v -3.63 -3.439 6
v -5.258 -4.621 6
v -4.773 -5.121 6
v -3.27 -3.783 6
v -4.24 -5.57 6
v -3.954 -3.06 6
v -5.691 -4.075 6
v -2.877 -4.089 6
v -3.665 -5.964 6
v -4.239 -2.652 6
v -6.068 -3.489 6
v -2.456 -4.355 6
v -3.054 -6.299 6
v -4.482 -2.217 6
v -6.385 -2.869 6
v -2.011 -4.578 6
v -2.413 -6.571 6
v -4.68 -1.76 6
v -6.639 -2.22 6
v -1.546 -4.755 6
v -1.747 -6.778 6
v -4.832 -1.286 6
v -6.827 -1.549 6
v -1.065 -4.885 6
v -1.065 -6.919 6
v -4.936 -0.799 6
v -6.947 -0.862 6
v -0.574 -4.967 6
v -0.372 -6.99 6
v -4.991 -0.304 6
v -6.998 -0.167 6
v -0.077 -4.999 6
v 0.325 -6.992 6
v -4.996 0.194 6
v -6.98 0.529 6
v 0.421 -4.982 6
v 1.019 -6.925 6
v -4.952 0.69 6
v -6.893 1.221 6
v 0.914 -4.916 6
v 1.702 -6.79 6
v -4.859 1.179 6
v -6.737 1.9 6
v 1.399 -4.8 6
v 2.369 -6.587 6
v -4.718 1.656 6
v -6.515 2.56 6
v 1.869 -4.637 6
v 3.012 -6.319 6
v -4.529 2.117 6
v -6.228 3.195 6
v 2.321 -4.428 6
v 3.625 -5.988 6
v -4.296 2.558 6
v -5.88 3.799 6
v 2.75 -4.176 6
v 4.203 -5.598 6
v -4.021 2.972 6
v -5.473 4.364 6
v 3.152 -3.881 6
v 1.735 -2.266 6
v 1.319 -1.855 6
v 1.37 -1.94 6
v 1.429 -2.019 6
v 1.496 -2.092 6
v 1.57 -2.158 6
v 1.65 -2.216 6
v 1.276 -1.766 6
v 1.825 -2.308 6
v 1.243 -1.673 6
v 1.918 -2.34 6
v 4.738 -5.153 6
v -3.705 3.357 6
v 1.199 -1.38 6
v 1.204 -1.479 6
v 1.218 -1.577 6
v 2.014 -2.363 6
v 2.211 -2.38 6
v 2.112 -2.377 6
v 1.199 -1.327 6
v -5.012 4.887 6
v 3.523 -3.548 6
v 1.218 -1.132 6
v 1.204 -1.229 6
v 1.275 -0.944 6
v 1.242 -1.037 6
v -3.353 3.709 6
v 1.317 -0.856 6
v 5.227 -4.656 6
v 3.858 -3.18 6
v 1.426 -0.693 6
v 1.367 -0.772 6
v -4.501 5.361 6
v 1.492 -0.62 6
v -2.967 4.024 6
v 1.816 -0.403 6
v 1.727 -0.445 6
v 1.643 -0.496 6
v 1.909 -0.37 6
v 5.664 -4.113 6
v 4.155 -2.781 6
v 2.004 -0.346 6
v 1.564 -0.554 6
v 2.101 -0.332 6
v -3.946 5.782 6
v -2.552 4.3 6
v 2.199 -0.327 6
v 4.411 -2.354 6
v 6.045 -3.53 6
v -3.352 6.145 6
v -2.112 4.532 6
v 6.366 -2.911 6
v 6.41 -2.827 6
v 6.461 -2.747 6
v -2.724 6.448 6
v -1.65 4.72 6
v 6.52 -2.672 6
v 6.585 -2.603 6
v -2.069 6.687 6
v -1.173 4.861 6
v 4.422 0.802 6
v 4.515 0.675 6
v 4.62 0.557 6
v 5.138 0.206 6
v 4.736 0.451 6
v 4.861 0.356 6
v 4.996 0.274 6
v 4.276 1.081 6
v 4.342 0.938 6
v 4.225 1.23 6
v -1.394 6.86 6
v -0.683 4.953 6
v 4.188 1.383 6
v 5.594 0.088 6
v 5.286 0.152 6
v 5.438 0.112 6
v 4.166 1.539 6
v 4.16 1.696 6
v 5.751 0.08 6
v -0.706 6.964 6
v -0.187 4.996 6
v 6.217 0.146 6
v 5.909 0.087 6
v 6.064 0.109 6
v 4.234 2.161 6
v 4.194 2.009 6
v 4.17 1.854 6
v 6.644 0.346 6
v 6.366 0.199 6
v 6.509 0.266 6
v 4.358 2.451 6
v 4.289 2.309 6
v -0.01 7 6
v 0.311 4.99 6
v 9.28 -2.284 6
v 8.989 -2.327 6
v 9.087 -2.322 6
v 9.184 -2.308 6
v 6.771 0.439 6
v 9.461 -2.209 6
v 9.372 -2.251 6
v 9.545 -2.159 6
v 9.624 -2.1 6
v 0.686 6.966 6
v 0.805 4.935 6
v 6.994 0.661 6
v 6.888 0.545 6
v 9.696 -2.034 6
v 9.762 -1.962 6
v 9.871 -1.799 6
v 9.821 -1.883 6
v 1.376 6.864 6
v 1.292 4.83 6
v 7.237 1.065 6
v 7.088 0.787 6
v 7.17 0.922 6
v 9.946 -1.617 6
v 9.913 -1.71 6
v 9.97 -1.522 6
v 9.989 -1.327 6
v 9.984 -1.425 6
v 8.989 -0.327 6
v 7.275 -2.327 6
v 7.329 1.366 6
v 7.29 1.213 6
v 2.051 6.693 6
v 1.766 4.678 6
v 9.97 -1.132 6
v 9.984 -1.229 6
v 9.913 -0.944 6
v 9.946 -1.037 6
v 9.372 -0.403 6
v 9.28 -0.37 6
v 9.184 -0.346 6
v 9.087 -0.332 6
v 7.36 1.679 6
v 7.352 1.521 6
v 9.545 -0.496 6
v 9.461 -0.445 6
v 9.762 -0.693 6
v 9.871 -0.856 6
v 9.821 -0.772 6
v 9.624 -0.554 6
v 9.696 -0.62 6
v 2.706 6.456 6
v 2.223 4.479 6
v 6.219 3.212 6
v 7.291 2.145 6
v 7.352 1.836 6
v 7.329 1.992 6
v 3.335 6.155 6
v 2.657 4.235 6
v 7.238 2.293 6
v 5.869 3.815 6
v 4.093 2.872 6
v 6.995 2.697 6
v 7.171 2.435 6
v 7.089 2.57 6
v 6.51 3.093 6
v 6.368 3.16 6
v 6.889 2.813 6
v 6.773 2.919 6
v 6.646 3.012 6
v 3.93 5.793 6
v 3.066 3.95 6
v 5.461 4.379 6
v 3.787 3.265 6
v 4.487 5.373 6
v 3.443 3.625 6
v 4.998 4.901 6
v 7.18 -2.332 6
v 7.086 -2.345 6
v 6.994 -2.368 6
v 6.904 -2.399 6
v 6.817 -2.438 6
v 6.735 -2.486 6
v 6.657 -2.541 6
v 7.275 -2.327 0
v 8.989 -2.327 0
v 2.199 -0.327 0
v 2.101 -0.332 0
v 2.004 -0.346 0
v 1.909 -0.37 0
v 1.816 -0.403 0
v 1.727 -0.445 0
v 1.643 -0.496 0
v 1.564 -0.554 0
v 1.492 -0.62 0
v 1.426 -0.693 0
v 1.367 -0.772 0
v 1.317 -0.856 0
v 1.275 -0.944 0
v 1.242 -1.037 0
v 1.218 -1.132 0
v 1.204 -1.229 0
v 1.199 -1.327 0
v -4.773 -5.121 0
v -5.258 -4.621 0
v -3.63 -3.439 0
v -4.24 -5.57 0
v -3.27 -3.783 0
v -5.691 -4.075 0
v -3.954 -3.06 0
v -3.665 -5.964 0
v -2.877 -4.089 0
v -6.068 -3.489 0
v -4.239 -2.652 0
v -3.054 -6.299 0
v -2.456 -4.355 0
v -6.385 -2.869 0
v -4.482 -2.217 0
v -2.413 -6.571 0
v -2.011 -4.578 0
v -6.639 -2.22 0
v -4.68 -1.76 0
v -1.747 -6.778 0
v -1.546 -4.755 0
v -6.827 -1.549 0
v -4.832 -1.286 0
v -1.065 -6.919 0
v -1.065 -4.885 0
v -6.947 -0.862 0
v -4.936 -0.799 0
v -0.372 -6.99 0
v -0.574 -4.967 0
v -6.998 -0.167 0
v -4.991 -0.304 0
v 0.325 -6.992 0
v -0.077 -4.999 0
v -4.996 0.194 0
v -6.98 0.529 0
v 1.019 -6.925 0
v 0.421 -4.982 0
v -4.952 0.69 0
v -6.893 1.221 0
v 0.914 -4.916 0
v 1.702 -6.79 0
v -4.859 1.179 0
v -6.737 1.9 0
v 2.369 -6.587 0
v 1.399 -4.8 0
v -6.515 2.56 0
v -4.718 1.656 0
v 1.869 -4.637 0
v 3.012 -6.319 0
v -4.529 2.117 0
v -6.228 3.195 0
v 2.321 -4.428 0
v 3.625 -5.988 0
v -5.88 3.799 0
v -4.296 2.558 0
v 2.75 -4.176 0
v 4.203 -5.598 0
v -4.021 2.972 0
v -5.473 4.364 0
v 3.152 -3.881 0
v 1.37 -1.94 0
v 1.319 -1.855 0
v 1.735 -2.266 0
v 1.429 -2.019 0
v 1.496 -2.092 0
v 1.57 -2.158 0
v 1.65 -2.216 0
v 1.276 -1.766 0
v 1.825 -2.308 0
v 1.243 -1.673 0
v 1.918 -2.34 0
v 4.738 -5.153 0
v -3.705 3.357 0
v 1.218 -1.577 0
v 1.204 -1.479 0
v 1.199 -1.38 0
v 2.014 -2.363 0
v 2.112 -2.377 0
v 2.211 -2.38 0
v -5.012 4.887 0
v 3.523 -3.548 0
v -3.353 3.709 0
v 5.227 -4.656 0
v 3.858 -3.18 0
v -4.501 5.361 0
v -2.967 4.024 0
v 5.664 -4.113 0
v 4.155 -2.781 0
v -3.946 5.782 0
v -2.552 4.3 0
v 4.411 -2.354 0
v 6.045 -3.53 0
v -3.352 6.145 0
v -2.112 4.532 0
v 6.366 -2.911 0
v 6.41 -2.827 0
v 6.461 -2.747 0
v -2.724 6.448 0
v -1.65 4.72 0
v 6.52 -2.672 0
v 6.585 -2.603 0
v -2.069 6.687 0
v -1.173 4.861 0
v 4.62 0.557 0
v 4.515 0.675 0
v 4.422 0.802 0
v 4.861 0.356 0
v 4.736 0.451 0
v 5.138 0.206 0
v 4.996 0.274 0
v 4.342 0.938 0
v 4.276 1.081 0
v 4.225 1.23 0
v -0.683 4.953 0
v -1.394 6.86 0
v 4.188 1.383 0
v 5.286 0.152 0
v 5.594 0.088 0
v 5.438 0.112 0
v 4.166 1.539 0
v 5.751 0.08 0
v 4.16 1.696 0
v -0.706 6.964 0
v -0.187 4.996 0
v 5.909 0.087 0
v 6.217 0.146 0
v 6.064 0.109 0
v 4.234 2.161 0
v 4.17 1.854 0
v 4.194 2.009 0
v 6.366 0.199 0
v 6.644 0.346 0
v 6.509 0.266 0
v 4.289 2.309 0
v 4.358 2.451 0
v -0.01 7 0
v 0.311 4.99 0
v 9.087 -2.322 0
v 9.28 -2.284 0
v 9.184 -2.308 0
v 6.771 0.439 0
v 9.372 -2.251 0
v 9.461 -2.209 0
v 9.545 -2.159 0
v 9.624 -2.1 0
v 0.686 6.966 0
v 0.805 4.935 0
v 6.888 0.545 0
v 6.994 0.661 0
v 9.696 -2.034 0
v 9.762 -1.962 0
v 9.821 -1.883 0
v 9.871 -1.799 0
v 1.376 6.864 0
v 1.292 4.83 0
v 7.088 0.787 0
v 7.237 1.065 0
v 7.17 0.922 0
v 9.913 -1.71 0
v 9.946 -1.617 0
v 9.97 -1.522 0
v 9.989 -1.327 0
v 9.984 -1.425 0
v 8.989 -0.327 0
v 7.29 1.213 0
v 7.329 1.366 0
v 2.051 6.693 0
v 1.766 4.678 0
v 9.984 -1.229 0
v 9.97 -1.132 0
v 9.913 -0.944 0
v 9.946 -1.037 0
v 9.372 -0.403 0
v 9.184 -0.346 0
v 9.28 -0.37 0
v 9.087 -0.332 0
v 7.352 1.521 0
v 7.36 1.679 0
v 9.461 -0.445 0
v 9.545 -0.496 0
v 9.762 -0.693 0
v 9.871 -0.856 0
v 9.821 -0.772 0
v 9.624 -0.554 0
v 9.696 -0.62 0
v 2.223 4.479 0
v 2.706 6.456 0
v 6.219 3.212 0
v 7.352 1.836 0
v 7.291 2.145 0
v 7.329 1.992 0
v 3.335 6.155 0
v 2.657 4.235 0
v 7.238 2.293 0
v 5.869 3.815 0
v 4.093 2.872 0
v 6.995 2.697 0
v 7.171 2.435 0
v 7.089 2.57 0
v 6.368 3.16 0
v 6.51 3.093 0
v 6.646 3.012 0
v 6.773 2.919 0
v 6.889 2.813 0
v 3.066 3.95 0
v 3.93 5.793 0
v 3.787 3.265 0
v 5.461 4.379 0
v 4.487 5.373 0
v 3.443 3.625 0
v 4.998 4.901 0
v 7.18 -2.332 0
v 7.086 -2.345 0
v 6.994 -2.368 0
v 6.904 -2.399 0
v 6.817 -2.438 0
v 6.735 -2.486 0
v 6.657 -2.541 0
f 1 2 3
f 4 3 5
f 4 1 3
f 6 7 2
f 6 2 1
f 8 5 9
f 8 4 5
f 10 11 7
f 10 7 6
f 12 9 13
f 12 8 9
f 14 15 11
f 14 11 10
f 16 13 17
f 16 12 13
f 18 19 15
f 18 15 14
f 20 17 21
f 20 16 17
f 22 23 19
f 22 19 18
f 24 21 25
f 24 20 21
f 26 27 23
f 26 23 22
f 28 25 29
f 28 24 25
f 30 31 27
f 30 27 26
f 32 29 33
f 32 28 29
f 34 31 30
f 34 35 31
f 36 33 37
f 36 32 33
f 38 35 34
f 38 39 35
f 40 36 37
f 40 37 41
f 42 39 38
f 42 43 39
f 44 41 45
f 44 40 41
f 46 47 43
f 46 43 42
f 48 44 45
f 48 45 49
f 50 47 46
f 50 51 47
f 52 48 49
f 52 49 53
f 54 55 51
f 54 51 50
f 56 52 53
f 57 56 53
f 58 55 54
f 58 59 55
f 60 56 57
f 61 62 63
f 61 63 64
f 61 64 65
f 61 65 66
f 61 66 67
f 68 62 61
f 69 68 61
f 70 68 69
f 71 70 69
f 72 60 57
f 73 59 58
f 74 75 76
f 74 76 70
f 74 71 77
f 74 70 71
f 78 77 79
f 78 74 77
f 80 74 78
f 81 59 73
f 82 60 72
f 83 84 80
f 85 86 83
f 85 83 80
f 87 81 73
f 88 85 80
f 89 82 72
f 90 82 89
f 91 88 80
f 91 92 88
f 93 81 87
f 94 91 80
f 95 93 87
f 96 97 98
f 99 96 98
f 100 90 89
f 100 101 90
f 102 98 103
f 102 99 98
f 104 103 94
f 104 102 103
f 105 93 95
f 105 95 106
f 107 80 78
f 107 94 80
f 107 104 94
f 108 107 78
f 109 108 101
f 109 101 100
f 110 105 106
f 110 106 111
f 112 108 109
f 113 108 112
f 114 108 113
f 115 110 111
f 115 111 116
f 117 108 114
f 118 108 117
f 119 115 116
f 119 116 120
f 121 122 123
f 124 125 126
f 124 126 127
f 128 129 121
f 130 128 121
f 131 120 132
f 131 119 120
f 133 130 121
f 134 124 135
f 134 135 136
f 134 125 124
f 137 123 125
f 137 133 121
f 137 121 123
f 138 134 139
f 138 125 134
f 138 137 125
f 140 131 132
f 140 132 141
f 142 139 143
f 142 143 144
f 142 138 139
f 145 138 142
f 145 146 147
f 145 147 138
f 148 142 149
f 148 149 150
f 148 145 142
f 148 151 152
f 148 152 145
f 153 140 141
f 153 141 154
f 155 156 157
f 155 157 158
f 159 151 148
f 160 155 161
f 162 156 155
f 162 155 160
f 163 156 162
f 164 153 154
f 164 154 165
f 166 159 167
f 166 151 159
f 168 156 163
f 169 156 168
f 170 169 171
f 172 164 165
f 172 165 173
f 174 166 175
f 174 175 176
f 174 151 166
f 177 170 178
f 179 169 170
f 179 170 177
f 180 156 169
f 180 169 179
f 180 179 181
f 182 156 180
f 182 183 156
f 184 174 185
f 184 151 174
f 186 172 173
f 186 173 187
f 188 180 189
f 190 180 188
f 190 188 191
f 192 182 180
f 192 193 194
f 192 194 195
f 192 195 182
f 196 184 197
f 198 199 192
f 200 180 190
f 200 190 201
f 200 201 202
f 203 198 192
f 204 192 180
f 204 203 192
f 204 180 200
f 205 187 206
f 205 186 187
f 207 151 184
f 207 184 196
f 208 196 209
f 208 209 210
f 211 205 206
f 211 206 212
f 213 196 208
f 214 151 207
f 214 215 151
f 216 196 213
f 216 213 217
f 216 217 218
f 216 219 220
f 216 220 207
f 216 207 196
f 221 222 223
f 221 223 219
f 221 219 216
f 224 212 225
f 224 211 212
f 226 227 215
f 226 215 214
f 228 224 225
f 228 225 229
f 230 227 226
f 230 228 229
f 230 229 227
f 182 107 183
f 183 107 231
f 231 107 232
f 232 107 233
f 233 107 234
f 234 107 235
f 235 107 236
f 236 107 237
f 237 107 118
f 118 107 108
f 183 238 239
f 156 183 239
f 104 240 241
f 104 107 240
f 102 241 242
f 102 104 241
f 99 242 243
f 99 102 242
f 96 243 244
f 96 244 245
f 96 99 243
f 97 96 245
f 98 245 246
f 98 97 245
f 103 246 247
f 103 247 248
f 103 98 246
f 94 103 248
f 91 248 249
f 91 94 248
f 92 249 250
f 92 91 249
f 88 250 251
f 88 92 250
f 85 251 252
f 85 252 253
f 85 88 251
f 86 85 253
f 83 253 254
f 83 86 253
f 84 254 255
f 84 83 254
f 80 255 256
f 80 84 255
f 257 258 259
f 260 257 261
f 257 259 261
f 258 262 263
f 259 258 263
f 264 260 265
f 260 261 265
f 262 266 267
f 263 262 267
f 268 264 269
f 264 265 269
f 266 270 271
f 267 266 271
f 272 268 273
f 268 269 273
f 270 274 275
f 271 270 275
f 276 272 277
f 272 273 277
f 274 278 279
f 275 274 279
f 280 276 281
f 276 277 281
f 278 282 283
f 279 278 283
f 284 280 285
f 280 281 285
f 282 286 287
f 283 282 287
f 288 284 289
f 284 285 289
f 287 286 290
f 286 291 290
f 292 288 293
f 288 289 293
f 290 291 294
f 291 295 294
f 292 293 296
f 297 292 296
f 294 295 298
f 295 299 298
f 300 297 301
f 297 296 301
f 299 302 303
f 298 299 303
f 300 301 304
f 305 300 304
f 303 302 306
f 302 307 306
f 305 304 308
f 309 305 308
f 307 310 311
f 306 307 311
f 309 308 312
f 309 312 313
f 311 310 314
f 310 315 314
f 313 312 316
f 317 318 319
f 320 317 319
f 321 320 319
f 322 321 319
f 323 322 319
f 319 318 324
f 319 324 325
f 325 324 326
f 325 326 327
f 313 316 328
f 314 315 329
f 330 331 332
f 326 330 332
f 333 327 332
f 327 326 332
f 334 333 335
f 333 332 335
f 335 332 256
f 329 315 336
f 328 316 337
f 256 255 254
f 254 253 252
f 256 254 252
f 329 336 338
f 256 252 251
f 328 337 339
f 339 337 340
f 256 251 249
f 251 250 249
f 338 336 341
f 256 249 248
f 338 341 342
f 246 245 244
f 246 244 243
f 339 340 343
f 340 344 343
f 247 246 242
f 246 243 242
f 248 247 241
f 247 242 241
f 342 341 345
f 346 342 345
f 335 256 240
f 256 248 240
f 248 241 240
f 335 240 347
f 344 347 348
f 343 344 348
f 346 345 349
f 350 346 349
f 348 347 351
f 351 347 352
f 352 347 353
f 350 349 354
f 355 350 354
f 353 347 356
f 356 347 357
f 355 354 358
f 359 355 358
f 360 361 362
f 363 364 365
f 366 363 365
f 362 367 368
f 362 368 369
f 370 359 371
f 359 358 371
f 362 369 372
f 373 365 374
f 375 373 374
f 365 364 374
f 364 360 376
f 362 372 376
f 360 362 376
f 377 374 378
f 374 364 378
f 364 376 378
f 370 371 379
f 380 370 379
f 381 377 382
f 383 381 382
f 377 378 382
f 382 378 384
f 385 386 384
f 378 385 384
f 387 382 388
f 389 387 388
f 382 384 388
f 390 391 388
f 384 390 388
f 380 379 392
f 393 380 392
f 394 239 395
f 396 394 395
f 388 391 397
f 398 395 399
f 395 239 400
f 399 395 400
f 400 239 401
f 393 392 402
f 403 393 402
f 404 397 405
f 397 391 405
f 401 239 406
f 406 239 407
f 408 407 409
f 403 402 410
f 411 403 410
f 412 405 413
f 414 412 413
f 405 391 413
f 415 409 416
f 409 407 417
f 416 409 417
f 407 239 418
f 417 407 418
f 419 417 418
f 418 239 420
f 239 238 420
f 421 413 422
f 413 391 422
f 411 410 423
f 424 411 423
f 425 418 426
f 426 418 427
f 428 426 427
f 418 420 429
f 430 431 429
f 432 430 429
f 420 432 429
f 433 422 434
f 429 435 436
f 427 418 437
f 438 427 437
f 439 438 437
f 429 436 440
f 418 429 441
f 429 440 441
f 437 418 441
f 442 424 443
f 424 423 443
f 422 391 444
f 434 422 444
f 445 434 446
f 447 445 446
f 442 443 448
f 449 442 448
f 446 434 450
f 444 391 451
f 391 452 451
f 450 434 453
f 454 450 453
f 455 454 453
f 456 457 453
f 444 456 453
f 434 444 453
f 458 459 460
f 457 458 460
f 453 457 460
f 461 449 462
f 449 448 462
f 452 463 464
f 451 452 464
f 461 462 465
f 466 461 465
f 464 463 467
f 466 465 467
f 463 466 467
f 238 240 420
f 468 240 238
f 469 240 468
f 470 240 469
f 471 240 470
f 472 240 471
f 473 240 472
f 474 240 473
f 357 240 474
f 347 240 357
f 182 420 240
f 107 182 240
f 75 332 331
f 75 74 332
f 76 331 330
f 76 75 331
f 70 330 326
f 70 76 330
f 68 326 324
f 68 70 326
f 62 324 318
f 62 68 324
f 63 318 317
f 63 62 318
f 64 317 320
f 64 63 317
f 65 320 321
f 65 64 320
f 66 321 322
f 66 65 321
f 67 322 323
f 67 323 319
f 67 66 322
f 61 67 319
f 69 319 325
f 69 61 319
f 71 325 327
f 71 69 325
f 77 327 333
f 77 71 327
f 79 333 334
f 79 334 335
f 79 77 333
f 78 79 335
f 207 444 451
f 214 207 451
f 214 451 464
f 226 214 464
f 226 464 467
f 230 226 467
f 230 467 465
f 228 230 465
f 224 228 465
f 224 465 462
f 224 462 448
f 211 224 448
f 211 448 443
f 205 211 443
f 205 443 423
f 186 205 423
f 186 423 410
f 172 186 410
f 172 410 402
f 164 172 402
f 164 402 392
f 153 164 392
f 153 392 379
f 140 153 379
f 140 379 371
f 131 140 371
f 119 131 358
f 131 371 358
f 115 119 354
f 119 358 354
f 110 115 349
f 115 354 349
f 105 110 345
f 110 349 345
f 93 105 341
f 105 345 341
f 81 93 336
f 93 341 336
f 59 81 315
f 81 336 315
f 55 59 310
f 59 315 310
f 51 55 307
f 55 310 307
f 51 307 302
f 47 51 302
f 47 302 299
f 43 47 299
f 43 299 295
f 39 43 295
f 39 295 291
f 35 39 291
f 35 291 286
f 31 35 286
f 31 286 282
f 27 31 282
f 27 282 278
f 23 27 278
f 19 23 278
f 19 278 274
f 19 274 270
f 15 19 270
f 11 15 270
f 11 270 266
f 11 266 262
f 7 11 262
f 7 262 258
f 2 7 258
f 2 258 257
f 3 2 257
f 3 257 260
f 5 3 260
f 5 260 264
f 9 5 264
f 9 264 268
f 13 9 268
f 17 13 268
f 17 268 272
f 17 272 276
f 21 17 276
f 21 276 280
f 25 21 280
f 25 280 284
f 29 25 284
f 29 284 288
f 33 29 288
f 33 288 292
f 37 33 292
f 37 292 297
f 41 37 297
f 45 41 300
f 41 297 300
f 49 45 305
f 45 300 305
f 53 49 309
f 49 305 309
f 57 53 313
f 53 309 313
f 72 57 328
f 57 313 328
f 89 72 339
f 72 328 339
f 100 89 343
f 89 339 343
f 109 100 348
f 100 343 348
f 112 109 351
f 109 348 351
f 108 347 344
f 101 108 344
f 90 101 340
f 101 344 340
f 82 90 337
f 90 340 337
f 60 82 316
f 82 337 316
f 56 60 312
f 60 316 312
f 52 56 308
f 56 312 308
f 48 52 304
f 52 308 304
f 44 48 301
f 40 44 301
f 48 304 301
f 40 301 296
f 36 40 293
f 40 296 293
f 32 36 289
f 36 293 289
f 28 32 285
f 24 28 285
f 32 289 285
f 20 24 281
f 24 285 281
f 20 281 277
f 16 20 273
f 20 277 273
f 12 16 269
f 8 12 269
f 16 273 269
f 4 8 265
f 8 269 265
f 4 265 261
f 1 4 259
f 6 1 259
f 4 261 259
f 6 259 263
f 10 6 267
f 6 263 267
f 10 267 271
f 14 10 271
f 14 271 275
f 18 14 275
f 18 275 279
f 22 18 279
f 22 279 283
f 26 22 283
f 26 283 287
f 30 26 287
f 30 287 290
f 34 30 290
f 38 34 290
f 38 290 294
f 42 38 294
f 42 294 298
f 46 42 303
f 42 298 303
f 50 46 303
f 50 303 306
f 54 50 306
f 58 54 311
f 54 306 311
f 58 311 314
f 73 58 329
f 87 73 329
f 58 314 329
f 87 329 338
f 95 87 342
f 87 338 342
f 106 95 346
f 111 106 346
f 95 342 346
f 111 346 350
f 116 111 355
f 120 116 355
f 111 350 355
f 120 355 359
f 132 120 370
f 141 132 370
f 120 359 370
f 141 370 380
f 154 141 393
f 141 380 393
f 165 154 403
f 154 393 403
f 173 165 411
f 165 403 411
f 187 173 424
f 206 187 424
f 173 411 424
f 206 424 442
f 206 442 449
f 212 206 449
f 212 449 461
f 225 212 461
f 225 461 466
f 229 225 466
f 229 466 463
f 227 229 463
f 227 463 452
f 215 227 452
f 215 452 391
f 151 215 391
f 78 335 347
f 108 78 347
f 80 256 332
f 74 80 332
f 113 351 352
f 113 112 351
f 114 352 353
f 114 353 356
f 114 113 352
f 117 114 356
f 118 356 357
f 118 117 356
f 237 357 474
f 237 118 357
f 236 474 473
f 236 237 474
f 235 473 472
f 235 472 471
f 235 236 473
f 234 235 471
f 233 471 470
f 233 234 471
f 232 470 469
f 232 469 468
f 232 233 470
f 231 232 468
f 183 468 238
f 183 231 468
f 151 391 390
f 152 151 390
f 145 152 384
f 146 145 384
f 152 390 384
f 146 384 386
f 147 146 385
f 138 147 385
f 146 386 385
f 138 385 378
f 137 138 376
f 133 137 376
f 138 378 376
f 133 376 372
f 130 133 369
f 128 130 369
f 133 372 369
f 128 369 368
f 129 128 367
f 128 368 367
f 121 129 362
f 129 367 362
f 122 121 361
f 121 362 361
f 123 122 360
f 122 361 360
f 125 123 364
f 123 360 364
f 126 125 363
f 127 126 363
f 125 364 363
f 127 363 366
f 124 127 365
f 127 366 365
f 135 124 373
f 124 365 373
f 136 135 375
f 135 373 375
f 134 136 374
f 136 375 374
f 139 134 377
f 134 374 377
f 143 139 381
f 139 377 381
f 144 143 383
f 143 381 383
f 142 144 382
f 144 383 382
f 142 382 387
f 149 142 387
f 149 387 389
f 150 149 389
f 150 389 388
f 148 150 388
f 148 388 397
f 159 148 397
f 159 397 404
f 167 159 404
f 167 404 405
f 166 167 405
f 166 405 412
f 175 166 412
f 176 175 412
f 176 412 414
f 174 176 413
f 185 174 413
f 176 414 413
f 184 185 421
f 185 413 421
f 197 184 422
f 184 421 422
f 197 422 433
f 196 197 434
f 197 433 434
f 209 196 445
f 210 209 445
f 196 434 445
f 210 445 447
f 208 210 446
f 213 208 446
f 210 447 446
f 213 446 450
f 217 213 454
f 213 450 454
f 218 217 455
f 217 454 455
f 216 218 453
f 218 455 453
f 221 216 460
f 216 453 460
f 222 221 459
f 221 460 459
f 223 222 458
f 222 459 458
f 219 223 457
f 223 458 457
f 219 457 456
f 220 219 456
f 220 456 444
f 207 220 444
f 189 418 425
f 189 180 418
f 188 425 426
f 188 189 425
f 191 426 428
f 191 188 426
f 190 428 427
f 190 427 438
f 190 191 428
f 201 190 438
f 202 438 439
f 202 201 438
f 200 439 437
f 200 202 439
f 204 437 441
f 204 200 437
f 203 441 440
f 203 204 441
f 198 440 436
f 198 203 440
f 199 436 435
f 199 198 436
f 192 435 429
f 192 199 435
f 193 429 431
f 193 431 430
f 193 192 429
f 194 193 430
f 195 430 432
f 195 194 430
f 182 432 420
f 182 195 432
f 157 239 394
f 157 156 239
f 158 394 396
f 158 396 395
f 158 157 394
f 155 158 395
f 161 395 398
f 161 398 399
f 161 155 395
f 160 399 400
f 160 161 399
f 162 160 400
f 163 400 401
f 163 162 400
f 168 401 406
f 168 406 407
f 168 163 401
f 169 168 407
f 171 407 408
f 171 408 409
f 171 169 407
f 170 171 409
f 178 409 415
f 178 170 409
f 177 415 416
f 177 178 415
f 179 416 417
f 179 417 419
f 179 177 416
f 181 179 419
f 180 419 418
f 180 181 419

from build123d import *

# Parameters (mm, degrees)
F1_DEPTH = 6
F2_R     = 0.99999


# Not quite as in the source:
# - a fillet or chamfer is up to 0.001 mm smaller than in the source, because OpenCascade refuses the exact size


with BuildPart() as f1:
    # F0 (on Top) → F1 (new body)
    with BuildSketch(Plane.XY):
        with BuildLine():
            ThreePointArc((4.411359383, -2.3537009993), (-4.9996939131, -0.0553242752), (4.3581956764, 2.4507407954))
            ThreePointArc((4.3581956764, 2.4507407954), (6.3660027692, 0.1987741987), (6.2194307383, 3.2122704263))
            ThreePointArc((6.2194307383, 3.2122704263), (-6.9833792075, -0.482094228), (6.6018426545, -2.3271599784))
            Line((6.6018426545, -2.3271599784), (9.9892851541, -2.3271599784))
            Line((9.9892851541, -2.3271599784), (9.9892851541, -0.3271599784))
            Line((9.9892851541, -0.3271599784), (4.9892851541, -0.3271599784))
            Line((4.9892851541, -0.3271599784), (1.1988097103, -0.3271599784))
            Line((1.1988097103, -0.3271599784), (1.1988097103, -2.3926259018))
            Line((1.1988097103, -2.3926259018), (4.411359383, -2.3537009993))
        make_face()
    extrude(amount=F1_DEPTH)

    # F2 (radius 1 in the source; OpenCascade refuses exactly that, so slightly less here)
    f2_edges = [f1.edges().sort_by_distance(p)[0] for p in [
        (9.989285, -0.32716, 3),
        (1.19881, -0.32716, 3),
        (1.19881, -2.392626, 3),
        (9.989285, -2.32716, 3),
        (6.601843, -2.32716, 3),
    ]]
    fillet(f2_edges, radius=F2_R)


solid = f1.part
